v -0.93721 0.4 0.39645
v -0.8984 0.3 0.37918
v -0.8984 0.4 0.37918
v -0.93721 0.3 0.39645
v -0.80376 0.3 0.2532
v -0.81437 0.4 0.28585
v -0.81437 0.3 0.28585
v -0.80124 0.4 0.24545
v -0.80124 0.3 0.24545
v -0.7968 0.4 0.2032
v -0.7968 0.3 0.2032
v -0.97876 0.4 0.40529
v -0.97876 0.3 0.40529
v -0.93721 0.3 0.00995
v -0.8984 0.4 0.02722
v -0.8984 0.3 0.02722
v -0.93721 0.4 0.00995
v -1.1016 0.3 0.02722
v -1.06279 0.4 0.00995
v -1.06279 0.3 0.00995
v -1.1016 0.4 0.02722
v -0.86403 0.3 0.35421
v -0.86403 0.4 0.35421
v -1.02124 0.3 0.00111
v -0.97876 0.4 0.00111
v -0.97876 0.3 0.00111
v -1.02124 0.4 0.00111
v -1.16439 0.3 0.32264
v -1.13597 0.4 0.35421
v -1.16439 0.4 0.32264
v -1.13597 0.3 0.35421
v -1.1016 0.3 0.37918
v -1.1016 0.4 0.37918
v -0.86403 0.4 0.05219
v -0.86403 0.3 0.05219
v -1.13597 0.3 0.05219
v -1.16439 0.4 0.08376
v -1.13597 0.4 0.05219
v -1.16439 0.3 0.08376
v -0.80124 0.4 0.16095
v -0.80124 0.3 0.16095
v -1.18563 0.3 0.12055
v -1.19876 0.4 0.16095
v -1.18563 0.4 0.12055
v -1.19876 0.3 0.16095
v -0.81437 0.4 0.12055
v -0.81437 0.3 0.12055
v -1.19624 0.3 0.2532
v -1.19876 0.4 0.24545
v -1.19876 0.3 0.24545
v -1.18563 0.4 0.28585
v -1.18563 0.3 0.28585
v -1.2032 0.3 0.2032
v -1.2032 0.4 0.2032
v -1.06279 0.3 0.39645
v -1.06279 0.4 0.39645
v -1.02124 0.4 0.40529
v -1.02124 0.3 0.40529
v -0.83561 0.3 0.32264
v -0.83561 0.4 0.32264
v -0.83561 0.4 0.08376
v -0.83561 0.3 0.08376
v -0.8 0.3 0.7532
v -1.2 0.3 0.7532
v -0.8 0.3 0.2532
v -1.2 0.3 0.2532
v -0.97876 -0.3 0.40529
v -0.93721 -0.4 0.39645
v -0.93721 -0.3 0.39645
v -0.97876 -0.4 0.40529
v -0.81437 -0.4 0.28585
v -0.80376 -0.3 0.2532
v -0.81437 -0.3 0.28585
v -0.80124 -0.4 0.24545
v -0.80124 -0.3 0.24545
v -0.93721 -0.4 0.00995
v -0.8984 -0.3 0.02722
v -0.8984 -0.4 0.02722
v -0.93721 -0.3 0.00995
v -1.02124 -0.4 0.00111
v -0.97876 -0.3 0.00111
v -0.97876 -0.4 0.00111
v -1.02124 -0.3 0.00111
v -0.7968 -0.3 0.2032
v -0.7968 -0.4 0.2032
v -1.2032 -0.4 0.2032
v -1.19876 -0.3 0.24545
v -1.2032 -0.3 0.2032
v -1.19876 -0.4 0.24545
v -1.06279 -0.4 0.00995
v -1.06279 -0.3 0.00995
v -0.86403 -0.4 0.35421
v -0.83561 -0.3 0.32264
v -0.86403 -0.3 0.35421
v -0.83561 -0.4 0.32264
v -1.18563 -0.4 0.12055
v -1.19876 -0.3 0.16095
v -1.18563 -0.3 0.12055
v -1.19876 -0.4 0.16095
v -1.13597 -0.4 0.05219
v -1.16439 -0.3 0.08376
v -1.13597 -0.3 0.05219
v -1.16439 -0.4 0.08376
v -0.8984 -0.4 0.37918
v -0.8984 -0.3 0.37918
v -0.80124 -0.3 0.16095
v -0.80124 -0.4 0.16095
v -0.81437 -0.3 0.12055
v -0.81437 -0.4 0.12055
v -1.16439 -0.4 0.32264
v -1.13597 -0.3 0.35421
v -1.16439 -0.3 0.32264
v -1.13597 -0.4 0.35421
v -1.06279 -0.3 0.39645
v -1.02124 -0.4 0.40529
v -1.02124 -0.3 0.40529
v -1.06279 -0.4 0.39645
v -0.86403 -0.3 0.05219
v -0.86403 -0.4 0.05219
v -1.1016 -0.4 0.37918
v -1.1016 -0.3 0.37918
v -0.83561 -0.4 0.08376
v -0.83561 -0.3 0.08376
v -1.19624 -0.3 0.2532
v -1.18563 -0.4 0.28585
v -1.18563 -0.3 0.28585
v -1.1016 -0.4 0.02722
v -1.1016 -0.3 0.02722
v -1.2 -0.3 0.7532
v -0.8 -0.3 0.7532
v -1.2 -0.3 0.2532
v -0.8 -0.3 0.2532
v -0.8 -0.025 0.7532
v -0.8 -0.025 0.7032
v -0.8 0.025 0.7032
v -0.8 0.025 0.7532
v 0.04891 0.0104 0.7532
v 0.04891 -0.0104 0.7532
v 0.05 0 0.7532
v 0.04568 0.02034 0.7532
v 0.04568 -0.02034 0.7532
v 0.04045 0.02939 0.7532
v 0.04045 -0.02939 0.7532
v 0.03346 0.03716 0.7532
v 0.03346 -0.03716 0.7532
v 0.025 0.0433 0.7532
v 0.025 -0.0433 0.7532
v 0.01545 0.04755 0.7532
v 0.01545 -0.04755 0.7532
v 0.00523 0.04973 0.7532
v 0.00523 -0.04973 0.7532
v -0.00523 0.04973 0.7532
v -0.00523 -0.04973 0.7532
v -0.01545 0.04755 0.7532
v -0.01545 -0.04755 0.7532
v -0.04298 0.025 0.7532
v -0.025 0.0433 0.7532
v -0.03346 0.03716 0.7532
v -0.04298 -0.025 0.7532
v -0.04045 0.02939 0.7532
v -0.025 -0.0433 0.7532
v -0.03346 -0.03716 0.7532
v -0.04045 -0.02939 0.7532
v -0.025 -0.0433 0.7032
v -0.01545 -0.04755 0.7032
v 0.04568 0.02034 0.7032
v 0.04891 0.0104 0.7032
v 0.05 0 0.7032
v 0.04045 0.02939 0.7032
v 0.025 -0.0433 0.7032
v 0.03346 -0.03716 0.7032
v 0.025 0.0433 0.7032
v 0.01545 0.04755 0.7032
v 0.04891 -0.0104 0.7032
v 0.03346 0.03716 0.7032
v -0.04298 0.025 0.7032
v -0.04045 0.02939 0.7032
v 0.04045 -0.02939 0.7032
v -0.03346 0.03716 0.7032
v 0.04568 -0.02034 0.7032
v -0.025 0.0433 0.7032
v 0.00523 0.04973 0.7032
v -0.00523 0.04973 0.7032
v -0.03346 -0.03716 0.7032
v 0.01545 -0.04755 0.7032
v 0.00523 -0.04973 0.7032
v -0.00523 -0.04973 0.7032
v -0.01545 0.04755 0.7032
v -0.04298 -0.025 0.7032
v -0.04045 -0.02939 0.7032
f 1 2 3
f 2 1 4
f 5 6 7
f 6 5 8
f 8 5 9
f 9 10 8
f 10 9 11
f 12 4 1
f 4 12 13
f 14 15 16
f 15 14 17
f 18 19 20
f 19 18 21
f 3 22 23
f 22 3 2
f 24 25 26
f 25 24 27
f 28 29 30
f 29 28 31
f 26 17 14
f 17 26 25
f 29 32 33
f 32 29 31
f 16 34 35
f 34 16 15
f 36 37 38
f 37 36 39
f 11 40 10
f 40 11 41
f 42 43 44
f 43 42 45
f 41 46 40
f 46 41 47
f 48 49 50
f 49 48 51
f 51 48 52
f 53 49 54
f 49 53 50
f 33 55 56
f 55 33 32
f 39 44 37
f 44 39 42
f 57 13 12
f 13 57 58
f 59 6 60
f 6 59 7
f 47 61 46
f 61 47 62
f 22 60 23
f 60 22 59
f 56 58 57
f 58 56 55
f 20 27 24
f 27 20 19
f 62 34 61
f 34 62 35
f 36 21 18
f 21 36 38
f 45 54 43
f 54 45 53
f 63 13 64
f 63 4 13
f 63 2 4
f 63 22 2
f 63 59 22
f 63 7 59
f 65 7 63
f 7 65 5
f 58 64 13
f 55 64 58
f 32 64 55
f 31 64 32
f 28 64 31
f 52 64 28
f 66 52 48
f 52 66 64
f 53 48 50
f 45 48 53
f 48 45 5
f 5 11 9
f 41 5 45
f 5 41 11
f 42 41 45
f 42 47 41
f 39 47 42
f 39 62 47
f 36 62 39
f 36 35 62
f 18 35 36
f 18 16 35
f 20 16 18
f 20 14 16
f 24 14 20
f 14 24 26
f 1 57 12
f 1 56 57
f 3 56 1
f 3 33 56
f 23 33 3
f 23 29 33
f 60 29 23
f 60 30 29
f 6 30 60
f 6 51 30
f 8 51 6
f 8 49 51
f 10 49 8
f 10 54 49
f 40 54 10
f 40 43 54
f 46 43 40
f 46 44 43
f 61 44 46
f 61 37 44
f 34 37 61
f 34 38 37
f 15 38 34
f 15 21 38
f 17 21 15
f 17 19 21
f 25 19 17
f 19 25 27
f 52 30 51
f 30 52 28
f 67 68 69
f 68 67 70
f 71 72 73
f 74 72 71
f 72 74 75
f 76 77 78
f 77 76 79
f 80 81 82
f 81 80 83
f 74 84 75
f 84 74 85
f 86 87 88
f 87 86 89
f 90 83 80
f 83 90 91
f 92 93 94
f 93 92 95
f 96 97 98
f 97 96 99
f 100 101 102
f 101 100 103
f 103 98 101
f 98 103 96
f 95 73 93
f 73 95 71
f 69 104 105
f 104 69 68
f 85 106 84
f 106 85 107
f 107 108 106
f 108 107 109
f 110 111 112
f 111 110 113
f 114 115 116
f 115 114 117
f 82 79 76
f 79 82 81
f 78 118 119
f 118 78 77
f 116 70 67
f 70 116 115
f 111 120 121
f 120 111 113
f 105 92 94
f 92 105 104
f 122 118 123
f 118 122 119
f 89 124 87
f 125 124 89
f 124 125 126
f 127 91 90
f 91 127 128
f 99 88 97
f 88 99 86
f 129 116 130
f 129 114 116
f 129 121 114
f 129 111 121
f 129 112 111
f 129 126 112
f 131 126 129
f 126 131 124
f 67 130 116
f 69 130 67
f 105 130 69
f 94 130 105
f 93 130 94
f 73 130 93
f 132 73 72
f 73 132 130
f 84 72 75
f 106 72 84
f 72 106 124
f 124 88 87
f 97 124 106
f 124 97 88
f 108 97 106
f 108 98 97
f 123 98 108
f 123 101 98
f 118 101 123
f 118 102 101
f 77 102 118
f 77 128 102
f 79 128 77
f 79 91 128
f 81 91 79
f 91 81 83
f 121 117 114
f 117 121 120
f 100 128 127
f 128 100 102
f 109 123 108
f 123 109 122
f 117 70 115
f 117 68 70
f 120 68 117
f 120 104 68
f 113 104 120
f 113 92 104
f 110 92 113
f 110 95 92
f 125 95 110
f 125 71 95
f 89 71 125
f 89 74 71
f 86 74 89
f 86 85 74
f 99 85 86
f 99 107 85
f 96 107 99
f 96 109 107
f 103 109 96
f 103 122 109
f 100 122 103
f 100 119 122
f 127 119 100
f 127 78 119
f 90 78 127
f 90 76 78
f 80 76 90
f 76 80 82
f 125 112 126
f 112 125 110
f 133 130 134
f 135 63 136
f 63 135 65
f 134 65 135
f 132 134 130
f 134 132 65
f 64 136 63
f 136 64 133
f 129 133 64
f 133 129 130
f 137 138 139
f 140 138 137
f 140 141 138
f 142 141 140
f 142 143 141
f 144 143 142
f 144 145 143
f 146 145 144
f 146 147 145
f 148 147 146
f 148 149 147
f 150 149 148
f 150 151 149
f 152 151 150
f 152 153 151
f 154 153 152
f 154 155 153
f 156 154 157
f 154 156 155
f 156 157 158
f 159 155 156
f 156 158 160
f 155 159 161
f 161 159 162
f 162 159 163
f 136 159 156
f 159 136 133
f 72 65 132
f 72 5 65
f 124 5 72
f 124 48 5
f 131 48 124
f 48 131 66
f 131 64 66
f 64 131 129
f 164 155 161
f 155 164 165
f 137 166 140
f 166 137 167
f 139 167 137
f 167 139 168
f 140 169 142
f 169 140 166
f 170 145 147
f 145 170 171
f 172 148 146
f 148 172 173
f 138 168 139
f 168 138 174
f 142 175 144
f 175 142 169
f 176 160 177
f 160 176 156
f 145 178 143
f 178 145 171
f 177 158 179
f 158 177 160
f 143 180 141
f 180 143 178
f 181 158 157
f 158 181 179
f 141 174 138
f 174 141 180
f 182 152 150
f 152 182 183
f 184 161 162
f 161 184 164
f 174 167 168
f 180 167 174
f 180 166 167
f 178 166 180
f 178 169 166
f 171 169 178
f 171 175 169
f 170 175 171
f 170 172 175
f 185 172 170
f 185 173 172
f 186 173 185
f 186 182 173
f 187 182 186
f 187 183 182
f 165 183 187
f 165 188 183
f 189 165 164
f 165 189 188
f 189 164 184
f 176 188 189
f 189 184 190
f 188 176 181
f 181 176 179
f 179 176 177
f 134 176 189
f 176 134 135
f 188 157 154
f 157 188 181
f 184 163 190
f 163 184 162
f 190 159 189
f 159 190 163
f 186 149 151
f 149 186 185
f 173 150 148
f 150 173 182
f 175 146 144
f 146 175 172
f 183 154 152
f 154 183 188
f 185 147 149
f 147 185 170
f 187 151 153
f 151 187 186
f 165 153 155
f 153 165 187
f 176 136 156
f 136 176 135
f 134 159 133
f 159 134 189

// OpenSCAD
wheel_r=25.4*8;
wheel_w=100;

front_d=500;
front_w=600;
front_h=400;

back_d=400;
back_w=600;
back_h=500;

scale([1/1000, 1/1000, 1/1000]){

/*
// front
translate([00,front_w/2+wheel_w/2,wheel_r]) rotate([90, 0, 0]) cylinder(h=wheel_w,r=wheel_r,center=true);
translate([00,-(front_w/2+wheel_w/2),wheel_r]) rotate([90, 0, 0]) cylinder(h=wheel_w,r=wheel_r,center=true);
translate([00,0,wheel_r+front_h-100])cube([front_d, front_w, front_h],center=true);
*/

// back
translate([0,0,wheel_r+front_h+125]) cylinder(h=50,r=50,center=true);
translate([-500,0,wheel_r+front_h+125])cube([1000, 50, 50],center=true);
translate([-1000,0,0])union(){
translate([00,back_w/2+wheel_w/2,wheel_r]) rotate([90, 0, 0]) cylinder(h=wheel_w,r=wheel_r,center=true);
translate([00,-(back_w/2+wheel_w/2),wheel_r]) rotate([90, 0, 0]) cylinder(h=wheel_w,r=wheel_r,center=true);
translate([00,0,wheel_r+back_h-200])cube([back_d, back_w, back_h],center=true);
// bar top
}

}
